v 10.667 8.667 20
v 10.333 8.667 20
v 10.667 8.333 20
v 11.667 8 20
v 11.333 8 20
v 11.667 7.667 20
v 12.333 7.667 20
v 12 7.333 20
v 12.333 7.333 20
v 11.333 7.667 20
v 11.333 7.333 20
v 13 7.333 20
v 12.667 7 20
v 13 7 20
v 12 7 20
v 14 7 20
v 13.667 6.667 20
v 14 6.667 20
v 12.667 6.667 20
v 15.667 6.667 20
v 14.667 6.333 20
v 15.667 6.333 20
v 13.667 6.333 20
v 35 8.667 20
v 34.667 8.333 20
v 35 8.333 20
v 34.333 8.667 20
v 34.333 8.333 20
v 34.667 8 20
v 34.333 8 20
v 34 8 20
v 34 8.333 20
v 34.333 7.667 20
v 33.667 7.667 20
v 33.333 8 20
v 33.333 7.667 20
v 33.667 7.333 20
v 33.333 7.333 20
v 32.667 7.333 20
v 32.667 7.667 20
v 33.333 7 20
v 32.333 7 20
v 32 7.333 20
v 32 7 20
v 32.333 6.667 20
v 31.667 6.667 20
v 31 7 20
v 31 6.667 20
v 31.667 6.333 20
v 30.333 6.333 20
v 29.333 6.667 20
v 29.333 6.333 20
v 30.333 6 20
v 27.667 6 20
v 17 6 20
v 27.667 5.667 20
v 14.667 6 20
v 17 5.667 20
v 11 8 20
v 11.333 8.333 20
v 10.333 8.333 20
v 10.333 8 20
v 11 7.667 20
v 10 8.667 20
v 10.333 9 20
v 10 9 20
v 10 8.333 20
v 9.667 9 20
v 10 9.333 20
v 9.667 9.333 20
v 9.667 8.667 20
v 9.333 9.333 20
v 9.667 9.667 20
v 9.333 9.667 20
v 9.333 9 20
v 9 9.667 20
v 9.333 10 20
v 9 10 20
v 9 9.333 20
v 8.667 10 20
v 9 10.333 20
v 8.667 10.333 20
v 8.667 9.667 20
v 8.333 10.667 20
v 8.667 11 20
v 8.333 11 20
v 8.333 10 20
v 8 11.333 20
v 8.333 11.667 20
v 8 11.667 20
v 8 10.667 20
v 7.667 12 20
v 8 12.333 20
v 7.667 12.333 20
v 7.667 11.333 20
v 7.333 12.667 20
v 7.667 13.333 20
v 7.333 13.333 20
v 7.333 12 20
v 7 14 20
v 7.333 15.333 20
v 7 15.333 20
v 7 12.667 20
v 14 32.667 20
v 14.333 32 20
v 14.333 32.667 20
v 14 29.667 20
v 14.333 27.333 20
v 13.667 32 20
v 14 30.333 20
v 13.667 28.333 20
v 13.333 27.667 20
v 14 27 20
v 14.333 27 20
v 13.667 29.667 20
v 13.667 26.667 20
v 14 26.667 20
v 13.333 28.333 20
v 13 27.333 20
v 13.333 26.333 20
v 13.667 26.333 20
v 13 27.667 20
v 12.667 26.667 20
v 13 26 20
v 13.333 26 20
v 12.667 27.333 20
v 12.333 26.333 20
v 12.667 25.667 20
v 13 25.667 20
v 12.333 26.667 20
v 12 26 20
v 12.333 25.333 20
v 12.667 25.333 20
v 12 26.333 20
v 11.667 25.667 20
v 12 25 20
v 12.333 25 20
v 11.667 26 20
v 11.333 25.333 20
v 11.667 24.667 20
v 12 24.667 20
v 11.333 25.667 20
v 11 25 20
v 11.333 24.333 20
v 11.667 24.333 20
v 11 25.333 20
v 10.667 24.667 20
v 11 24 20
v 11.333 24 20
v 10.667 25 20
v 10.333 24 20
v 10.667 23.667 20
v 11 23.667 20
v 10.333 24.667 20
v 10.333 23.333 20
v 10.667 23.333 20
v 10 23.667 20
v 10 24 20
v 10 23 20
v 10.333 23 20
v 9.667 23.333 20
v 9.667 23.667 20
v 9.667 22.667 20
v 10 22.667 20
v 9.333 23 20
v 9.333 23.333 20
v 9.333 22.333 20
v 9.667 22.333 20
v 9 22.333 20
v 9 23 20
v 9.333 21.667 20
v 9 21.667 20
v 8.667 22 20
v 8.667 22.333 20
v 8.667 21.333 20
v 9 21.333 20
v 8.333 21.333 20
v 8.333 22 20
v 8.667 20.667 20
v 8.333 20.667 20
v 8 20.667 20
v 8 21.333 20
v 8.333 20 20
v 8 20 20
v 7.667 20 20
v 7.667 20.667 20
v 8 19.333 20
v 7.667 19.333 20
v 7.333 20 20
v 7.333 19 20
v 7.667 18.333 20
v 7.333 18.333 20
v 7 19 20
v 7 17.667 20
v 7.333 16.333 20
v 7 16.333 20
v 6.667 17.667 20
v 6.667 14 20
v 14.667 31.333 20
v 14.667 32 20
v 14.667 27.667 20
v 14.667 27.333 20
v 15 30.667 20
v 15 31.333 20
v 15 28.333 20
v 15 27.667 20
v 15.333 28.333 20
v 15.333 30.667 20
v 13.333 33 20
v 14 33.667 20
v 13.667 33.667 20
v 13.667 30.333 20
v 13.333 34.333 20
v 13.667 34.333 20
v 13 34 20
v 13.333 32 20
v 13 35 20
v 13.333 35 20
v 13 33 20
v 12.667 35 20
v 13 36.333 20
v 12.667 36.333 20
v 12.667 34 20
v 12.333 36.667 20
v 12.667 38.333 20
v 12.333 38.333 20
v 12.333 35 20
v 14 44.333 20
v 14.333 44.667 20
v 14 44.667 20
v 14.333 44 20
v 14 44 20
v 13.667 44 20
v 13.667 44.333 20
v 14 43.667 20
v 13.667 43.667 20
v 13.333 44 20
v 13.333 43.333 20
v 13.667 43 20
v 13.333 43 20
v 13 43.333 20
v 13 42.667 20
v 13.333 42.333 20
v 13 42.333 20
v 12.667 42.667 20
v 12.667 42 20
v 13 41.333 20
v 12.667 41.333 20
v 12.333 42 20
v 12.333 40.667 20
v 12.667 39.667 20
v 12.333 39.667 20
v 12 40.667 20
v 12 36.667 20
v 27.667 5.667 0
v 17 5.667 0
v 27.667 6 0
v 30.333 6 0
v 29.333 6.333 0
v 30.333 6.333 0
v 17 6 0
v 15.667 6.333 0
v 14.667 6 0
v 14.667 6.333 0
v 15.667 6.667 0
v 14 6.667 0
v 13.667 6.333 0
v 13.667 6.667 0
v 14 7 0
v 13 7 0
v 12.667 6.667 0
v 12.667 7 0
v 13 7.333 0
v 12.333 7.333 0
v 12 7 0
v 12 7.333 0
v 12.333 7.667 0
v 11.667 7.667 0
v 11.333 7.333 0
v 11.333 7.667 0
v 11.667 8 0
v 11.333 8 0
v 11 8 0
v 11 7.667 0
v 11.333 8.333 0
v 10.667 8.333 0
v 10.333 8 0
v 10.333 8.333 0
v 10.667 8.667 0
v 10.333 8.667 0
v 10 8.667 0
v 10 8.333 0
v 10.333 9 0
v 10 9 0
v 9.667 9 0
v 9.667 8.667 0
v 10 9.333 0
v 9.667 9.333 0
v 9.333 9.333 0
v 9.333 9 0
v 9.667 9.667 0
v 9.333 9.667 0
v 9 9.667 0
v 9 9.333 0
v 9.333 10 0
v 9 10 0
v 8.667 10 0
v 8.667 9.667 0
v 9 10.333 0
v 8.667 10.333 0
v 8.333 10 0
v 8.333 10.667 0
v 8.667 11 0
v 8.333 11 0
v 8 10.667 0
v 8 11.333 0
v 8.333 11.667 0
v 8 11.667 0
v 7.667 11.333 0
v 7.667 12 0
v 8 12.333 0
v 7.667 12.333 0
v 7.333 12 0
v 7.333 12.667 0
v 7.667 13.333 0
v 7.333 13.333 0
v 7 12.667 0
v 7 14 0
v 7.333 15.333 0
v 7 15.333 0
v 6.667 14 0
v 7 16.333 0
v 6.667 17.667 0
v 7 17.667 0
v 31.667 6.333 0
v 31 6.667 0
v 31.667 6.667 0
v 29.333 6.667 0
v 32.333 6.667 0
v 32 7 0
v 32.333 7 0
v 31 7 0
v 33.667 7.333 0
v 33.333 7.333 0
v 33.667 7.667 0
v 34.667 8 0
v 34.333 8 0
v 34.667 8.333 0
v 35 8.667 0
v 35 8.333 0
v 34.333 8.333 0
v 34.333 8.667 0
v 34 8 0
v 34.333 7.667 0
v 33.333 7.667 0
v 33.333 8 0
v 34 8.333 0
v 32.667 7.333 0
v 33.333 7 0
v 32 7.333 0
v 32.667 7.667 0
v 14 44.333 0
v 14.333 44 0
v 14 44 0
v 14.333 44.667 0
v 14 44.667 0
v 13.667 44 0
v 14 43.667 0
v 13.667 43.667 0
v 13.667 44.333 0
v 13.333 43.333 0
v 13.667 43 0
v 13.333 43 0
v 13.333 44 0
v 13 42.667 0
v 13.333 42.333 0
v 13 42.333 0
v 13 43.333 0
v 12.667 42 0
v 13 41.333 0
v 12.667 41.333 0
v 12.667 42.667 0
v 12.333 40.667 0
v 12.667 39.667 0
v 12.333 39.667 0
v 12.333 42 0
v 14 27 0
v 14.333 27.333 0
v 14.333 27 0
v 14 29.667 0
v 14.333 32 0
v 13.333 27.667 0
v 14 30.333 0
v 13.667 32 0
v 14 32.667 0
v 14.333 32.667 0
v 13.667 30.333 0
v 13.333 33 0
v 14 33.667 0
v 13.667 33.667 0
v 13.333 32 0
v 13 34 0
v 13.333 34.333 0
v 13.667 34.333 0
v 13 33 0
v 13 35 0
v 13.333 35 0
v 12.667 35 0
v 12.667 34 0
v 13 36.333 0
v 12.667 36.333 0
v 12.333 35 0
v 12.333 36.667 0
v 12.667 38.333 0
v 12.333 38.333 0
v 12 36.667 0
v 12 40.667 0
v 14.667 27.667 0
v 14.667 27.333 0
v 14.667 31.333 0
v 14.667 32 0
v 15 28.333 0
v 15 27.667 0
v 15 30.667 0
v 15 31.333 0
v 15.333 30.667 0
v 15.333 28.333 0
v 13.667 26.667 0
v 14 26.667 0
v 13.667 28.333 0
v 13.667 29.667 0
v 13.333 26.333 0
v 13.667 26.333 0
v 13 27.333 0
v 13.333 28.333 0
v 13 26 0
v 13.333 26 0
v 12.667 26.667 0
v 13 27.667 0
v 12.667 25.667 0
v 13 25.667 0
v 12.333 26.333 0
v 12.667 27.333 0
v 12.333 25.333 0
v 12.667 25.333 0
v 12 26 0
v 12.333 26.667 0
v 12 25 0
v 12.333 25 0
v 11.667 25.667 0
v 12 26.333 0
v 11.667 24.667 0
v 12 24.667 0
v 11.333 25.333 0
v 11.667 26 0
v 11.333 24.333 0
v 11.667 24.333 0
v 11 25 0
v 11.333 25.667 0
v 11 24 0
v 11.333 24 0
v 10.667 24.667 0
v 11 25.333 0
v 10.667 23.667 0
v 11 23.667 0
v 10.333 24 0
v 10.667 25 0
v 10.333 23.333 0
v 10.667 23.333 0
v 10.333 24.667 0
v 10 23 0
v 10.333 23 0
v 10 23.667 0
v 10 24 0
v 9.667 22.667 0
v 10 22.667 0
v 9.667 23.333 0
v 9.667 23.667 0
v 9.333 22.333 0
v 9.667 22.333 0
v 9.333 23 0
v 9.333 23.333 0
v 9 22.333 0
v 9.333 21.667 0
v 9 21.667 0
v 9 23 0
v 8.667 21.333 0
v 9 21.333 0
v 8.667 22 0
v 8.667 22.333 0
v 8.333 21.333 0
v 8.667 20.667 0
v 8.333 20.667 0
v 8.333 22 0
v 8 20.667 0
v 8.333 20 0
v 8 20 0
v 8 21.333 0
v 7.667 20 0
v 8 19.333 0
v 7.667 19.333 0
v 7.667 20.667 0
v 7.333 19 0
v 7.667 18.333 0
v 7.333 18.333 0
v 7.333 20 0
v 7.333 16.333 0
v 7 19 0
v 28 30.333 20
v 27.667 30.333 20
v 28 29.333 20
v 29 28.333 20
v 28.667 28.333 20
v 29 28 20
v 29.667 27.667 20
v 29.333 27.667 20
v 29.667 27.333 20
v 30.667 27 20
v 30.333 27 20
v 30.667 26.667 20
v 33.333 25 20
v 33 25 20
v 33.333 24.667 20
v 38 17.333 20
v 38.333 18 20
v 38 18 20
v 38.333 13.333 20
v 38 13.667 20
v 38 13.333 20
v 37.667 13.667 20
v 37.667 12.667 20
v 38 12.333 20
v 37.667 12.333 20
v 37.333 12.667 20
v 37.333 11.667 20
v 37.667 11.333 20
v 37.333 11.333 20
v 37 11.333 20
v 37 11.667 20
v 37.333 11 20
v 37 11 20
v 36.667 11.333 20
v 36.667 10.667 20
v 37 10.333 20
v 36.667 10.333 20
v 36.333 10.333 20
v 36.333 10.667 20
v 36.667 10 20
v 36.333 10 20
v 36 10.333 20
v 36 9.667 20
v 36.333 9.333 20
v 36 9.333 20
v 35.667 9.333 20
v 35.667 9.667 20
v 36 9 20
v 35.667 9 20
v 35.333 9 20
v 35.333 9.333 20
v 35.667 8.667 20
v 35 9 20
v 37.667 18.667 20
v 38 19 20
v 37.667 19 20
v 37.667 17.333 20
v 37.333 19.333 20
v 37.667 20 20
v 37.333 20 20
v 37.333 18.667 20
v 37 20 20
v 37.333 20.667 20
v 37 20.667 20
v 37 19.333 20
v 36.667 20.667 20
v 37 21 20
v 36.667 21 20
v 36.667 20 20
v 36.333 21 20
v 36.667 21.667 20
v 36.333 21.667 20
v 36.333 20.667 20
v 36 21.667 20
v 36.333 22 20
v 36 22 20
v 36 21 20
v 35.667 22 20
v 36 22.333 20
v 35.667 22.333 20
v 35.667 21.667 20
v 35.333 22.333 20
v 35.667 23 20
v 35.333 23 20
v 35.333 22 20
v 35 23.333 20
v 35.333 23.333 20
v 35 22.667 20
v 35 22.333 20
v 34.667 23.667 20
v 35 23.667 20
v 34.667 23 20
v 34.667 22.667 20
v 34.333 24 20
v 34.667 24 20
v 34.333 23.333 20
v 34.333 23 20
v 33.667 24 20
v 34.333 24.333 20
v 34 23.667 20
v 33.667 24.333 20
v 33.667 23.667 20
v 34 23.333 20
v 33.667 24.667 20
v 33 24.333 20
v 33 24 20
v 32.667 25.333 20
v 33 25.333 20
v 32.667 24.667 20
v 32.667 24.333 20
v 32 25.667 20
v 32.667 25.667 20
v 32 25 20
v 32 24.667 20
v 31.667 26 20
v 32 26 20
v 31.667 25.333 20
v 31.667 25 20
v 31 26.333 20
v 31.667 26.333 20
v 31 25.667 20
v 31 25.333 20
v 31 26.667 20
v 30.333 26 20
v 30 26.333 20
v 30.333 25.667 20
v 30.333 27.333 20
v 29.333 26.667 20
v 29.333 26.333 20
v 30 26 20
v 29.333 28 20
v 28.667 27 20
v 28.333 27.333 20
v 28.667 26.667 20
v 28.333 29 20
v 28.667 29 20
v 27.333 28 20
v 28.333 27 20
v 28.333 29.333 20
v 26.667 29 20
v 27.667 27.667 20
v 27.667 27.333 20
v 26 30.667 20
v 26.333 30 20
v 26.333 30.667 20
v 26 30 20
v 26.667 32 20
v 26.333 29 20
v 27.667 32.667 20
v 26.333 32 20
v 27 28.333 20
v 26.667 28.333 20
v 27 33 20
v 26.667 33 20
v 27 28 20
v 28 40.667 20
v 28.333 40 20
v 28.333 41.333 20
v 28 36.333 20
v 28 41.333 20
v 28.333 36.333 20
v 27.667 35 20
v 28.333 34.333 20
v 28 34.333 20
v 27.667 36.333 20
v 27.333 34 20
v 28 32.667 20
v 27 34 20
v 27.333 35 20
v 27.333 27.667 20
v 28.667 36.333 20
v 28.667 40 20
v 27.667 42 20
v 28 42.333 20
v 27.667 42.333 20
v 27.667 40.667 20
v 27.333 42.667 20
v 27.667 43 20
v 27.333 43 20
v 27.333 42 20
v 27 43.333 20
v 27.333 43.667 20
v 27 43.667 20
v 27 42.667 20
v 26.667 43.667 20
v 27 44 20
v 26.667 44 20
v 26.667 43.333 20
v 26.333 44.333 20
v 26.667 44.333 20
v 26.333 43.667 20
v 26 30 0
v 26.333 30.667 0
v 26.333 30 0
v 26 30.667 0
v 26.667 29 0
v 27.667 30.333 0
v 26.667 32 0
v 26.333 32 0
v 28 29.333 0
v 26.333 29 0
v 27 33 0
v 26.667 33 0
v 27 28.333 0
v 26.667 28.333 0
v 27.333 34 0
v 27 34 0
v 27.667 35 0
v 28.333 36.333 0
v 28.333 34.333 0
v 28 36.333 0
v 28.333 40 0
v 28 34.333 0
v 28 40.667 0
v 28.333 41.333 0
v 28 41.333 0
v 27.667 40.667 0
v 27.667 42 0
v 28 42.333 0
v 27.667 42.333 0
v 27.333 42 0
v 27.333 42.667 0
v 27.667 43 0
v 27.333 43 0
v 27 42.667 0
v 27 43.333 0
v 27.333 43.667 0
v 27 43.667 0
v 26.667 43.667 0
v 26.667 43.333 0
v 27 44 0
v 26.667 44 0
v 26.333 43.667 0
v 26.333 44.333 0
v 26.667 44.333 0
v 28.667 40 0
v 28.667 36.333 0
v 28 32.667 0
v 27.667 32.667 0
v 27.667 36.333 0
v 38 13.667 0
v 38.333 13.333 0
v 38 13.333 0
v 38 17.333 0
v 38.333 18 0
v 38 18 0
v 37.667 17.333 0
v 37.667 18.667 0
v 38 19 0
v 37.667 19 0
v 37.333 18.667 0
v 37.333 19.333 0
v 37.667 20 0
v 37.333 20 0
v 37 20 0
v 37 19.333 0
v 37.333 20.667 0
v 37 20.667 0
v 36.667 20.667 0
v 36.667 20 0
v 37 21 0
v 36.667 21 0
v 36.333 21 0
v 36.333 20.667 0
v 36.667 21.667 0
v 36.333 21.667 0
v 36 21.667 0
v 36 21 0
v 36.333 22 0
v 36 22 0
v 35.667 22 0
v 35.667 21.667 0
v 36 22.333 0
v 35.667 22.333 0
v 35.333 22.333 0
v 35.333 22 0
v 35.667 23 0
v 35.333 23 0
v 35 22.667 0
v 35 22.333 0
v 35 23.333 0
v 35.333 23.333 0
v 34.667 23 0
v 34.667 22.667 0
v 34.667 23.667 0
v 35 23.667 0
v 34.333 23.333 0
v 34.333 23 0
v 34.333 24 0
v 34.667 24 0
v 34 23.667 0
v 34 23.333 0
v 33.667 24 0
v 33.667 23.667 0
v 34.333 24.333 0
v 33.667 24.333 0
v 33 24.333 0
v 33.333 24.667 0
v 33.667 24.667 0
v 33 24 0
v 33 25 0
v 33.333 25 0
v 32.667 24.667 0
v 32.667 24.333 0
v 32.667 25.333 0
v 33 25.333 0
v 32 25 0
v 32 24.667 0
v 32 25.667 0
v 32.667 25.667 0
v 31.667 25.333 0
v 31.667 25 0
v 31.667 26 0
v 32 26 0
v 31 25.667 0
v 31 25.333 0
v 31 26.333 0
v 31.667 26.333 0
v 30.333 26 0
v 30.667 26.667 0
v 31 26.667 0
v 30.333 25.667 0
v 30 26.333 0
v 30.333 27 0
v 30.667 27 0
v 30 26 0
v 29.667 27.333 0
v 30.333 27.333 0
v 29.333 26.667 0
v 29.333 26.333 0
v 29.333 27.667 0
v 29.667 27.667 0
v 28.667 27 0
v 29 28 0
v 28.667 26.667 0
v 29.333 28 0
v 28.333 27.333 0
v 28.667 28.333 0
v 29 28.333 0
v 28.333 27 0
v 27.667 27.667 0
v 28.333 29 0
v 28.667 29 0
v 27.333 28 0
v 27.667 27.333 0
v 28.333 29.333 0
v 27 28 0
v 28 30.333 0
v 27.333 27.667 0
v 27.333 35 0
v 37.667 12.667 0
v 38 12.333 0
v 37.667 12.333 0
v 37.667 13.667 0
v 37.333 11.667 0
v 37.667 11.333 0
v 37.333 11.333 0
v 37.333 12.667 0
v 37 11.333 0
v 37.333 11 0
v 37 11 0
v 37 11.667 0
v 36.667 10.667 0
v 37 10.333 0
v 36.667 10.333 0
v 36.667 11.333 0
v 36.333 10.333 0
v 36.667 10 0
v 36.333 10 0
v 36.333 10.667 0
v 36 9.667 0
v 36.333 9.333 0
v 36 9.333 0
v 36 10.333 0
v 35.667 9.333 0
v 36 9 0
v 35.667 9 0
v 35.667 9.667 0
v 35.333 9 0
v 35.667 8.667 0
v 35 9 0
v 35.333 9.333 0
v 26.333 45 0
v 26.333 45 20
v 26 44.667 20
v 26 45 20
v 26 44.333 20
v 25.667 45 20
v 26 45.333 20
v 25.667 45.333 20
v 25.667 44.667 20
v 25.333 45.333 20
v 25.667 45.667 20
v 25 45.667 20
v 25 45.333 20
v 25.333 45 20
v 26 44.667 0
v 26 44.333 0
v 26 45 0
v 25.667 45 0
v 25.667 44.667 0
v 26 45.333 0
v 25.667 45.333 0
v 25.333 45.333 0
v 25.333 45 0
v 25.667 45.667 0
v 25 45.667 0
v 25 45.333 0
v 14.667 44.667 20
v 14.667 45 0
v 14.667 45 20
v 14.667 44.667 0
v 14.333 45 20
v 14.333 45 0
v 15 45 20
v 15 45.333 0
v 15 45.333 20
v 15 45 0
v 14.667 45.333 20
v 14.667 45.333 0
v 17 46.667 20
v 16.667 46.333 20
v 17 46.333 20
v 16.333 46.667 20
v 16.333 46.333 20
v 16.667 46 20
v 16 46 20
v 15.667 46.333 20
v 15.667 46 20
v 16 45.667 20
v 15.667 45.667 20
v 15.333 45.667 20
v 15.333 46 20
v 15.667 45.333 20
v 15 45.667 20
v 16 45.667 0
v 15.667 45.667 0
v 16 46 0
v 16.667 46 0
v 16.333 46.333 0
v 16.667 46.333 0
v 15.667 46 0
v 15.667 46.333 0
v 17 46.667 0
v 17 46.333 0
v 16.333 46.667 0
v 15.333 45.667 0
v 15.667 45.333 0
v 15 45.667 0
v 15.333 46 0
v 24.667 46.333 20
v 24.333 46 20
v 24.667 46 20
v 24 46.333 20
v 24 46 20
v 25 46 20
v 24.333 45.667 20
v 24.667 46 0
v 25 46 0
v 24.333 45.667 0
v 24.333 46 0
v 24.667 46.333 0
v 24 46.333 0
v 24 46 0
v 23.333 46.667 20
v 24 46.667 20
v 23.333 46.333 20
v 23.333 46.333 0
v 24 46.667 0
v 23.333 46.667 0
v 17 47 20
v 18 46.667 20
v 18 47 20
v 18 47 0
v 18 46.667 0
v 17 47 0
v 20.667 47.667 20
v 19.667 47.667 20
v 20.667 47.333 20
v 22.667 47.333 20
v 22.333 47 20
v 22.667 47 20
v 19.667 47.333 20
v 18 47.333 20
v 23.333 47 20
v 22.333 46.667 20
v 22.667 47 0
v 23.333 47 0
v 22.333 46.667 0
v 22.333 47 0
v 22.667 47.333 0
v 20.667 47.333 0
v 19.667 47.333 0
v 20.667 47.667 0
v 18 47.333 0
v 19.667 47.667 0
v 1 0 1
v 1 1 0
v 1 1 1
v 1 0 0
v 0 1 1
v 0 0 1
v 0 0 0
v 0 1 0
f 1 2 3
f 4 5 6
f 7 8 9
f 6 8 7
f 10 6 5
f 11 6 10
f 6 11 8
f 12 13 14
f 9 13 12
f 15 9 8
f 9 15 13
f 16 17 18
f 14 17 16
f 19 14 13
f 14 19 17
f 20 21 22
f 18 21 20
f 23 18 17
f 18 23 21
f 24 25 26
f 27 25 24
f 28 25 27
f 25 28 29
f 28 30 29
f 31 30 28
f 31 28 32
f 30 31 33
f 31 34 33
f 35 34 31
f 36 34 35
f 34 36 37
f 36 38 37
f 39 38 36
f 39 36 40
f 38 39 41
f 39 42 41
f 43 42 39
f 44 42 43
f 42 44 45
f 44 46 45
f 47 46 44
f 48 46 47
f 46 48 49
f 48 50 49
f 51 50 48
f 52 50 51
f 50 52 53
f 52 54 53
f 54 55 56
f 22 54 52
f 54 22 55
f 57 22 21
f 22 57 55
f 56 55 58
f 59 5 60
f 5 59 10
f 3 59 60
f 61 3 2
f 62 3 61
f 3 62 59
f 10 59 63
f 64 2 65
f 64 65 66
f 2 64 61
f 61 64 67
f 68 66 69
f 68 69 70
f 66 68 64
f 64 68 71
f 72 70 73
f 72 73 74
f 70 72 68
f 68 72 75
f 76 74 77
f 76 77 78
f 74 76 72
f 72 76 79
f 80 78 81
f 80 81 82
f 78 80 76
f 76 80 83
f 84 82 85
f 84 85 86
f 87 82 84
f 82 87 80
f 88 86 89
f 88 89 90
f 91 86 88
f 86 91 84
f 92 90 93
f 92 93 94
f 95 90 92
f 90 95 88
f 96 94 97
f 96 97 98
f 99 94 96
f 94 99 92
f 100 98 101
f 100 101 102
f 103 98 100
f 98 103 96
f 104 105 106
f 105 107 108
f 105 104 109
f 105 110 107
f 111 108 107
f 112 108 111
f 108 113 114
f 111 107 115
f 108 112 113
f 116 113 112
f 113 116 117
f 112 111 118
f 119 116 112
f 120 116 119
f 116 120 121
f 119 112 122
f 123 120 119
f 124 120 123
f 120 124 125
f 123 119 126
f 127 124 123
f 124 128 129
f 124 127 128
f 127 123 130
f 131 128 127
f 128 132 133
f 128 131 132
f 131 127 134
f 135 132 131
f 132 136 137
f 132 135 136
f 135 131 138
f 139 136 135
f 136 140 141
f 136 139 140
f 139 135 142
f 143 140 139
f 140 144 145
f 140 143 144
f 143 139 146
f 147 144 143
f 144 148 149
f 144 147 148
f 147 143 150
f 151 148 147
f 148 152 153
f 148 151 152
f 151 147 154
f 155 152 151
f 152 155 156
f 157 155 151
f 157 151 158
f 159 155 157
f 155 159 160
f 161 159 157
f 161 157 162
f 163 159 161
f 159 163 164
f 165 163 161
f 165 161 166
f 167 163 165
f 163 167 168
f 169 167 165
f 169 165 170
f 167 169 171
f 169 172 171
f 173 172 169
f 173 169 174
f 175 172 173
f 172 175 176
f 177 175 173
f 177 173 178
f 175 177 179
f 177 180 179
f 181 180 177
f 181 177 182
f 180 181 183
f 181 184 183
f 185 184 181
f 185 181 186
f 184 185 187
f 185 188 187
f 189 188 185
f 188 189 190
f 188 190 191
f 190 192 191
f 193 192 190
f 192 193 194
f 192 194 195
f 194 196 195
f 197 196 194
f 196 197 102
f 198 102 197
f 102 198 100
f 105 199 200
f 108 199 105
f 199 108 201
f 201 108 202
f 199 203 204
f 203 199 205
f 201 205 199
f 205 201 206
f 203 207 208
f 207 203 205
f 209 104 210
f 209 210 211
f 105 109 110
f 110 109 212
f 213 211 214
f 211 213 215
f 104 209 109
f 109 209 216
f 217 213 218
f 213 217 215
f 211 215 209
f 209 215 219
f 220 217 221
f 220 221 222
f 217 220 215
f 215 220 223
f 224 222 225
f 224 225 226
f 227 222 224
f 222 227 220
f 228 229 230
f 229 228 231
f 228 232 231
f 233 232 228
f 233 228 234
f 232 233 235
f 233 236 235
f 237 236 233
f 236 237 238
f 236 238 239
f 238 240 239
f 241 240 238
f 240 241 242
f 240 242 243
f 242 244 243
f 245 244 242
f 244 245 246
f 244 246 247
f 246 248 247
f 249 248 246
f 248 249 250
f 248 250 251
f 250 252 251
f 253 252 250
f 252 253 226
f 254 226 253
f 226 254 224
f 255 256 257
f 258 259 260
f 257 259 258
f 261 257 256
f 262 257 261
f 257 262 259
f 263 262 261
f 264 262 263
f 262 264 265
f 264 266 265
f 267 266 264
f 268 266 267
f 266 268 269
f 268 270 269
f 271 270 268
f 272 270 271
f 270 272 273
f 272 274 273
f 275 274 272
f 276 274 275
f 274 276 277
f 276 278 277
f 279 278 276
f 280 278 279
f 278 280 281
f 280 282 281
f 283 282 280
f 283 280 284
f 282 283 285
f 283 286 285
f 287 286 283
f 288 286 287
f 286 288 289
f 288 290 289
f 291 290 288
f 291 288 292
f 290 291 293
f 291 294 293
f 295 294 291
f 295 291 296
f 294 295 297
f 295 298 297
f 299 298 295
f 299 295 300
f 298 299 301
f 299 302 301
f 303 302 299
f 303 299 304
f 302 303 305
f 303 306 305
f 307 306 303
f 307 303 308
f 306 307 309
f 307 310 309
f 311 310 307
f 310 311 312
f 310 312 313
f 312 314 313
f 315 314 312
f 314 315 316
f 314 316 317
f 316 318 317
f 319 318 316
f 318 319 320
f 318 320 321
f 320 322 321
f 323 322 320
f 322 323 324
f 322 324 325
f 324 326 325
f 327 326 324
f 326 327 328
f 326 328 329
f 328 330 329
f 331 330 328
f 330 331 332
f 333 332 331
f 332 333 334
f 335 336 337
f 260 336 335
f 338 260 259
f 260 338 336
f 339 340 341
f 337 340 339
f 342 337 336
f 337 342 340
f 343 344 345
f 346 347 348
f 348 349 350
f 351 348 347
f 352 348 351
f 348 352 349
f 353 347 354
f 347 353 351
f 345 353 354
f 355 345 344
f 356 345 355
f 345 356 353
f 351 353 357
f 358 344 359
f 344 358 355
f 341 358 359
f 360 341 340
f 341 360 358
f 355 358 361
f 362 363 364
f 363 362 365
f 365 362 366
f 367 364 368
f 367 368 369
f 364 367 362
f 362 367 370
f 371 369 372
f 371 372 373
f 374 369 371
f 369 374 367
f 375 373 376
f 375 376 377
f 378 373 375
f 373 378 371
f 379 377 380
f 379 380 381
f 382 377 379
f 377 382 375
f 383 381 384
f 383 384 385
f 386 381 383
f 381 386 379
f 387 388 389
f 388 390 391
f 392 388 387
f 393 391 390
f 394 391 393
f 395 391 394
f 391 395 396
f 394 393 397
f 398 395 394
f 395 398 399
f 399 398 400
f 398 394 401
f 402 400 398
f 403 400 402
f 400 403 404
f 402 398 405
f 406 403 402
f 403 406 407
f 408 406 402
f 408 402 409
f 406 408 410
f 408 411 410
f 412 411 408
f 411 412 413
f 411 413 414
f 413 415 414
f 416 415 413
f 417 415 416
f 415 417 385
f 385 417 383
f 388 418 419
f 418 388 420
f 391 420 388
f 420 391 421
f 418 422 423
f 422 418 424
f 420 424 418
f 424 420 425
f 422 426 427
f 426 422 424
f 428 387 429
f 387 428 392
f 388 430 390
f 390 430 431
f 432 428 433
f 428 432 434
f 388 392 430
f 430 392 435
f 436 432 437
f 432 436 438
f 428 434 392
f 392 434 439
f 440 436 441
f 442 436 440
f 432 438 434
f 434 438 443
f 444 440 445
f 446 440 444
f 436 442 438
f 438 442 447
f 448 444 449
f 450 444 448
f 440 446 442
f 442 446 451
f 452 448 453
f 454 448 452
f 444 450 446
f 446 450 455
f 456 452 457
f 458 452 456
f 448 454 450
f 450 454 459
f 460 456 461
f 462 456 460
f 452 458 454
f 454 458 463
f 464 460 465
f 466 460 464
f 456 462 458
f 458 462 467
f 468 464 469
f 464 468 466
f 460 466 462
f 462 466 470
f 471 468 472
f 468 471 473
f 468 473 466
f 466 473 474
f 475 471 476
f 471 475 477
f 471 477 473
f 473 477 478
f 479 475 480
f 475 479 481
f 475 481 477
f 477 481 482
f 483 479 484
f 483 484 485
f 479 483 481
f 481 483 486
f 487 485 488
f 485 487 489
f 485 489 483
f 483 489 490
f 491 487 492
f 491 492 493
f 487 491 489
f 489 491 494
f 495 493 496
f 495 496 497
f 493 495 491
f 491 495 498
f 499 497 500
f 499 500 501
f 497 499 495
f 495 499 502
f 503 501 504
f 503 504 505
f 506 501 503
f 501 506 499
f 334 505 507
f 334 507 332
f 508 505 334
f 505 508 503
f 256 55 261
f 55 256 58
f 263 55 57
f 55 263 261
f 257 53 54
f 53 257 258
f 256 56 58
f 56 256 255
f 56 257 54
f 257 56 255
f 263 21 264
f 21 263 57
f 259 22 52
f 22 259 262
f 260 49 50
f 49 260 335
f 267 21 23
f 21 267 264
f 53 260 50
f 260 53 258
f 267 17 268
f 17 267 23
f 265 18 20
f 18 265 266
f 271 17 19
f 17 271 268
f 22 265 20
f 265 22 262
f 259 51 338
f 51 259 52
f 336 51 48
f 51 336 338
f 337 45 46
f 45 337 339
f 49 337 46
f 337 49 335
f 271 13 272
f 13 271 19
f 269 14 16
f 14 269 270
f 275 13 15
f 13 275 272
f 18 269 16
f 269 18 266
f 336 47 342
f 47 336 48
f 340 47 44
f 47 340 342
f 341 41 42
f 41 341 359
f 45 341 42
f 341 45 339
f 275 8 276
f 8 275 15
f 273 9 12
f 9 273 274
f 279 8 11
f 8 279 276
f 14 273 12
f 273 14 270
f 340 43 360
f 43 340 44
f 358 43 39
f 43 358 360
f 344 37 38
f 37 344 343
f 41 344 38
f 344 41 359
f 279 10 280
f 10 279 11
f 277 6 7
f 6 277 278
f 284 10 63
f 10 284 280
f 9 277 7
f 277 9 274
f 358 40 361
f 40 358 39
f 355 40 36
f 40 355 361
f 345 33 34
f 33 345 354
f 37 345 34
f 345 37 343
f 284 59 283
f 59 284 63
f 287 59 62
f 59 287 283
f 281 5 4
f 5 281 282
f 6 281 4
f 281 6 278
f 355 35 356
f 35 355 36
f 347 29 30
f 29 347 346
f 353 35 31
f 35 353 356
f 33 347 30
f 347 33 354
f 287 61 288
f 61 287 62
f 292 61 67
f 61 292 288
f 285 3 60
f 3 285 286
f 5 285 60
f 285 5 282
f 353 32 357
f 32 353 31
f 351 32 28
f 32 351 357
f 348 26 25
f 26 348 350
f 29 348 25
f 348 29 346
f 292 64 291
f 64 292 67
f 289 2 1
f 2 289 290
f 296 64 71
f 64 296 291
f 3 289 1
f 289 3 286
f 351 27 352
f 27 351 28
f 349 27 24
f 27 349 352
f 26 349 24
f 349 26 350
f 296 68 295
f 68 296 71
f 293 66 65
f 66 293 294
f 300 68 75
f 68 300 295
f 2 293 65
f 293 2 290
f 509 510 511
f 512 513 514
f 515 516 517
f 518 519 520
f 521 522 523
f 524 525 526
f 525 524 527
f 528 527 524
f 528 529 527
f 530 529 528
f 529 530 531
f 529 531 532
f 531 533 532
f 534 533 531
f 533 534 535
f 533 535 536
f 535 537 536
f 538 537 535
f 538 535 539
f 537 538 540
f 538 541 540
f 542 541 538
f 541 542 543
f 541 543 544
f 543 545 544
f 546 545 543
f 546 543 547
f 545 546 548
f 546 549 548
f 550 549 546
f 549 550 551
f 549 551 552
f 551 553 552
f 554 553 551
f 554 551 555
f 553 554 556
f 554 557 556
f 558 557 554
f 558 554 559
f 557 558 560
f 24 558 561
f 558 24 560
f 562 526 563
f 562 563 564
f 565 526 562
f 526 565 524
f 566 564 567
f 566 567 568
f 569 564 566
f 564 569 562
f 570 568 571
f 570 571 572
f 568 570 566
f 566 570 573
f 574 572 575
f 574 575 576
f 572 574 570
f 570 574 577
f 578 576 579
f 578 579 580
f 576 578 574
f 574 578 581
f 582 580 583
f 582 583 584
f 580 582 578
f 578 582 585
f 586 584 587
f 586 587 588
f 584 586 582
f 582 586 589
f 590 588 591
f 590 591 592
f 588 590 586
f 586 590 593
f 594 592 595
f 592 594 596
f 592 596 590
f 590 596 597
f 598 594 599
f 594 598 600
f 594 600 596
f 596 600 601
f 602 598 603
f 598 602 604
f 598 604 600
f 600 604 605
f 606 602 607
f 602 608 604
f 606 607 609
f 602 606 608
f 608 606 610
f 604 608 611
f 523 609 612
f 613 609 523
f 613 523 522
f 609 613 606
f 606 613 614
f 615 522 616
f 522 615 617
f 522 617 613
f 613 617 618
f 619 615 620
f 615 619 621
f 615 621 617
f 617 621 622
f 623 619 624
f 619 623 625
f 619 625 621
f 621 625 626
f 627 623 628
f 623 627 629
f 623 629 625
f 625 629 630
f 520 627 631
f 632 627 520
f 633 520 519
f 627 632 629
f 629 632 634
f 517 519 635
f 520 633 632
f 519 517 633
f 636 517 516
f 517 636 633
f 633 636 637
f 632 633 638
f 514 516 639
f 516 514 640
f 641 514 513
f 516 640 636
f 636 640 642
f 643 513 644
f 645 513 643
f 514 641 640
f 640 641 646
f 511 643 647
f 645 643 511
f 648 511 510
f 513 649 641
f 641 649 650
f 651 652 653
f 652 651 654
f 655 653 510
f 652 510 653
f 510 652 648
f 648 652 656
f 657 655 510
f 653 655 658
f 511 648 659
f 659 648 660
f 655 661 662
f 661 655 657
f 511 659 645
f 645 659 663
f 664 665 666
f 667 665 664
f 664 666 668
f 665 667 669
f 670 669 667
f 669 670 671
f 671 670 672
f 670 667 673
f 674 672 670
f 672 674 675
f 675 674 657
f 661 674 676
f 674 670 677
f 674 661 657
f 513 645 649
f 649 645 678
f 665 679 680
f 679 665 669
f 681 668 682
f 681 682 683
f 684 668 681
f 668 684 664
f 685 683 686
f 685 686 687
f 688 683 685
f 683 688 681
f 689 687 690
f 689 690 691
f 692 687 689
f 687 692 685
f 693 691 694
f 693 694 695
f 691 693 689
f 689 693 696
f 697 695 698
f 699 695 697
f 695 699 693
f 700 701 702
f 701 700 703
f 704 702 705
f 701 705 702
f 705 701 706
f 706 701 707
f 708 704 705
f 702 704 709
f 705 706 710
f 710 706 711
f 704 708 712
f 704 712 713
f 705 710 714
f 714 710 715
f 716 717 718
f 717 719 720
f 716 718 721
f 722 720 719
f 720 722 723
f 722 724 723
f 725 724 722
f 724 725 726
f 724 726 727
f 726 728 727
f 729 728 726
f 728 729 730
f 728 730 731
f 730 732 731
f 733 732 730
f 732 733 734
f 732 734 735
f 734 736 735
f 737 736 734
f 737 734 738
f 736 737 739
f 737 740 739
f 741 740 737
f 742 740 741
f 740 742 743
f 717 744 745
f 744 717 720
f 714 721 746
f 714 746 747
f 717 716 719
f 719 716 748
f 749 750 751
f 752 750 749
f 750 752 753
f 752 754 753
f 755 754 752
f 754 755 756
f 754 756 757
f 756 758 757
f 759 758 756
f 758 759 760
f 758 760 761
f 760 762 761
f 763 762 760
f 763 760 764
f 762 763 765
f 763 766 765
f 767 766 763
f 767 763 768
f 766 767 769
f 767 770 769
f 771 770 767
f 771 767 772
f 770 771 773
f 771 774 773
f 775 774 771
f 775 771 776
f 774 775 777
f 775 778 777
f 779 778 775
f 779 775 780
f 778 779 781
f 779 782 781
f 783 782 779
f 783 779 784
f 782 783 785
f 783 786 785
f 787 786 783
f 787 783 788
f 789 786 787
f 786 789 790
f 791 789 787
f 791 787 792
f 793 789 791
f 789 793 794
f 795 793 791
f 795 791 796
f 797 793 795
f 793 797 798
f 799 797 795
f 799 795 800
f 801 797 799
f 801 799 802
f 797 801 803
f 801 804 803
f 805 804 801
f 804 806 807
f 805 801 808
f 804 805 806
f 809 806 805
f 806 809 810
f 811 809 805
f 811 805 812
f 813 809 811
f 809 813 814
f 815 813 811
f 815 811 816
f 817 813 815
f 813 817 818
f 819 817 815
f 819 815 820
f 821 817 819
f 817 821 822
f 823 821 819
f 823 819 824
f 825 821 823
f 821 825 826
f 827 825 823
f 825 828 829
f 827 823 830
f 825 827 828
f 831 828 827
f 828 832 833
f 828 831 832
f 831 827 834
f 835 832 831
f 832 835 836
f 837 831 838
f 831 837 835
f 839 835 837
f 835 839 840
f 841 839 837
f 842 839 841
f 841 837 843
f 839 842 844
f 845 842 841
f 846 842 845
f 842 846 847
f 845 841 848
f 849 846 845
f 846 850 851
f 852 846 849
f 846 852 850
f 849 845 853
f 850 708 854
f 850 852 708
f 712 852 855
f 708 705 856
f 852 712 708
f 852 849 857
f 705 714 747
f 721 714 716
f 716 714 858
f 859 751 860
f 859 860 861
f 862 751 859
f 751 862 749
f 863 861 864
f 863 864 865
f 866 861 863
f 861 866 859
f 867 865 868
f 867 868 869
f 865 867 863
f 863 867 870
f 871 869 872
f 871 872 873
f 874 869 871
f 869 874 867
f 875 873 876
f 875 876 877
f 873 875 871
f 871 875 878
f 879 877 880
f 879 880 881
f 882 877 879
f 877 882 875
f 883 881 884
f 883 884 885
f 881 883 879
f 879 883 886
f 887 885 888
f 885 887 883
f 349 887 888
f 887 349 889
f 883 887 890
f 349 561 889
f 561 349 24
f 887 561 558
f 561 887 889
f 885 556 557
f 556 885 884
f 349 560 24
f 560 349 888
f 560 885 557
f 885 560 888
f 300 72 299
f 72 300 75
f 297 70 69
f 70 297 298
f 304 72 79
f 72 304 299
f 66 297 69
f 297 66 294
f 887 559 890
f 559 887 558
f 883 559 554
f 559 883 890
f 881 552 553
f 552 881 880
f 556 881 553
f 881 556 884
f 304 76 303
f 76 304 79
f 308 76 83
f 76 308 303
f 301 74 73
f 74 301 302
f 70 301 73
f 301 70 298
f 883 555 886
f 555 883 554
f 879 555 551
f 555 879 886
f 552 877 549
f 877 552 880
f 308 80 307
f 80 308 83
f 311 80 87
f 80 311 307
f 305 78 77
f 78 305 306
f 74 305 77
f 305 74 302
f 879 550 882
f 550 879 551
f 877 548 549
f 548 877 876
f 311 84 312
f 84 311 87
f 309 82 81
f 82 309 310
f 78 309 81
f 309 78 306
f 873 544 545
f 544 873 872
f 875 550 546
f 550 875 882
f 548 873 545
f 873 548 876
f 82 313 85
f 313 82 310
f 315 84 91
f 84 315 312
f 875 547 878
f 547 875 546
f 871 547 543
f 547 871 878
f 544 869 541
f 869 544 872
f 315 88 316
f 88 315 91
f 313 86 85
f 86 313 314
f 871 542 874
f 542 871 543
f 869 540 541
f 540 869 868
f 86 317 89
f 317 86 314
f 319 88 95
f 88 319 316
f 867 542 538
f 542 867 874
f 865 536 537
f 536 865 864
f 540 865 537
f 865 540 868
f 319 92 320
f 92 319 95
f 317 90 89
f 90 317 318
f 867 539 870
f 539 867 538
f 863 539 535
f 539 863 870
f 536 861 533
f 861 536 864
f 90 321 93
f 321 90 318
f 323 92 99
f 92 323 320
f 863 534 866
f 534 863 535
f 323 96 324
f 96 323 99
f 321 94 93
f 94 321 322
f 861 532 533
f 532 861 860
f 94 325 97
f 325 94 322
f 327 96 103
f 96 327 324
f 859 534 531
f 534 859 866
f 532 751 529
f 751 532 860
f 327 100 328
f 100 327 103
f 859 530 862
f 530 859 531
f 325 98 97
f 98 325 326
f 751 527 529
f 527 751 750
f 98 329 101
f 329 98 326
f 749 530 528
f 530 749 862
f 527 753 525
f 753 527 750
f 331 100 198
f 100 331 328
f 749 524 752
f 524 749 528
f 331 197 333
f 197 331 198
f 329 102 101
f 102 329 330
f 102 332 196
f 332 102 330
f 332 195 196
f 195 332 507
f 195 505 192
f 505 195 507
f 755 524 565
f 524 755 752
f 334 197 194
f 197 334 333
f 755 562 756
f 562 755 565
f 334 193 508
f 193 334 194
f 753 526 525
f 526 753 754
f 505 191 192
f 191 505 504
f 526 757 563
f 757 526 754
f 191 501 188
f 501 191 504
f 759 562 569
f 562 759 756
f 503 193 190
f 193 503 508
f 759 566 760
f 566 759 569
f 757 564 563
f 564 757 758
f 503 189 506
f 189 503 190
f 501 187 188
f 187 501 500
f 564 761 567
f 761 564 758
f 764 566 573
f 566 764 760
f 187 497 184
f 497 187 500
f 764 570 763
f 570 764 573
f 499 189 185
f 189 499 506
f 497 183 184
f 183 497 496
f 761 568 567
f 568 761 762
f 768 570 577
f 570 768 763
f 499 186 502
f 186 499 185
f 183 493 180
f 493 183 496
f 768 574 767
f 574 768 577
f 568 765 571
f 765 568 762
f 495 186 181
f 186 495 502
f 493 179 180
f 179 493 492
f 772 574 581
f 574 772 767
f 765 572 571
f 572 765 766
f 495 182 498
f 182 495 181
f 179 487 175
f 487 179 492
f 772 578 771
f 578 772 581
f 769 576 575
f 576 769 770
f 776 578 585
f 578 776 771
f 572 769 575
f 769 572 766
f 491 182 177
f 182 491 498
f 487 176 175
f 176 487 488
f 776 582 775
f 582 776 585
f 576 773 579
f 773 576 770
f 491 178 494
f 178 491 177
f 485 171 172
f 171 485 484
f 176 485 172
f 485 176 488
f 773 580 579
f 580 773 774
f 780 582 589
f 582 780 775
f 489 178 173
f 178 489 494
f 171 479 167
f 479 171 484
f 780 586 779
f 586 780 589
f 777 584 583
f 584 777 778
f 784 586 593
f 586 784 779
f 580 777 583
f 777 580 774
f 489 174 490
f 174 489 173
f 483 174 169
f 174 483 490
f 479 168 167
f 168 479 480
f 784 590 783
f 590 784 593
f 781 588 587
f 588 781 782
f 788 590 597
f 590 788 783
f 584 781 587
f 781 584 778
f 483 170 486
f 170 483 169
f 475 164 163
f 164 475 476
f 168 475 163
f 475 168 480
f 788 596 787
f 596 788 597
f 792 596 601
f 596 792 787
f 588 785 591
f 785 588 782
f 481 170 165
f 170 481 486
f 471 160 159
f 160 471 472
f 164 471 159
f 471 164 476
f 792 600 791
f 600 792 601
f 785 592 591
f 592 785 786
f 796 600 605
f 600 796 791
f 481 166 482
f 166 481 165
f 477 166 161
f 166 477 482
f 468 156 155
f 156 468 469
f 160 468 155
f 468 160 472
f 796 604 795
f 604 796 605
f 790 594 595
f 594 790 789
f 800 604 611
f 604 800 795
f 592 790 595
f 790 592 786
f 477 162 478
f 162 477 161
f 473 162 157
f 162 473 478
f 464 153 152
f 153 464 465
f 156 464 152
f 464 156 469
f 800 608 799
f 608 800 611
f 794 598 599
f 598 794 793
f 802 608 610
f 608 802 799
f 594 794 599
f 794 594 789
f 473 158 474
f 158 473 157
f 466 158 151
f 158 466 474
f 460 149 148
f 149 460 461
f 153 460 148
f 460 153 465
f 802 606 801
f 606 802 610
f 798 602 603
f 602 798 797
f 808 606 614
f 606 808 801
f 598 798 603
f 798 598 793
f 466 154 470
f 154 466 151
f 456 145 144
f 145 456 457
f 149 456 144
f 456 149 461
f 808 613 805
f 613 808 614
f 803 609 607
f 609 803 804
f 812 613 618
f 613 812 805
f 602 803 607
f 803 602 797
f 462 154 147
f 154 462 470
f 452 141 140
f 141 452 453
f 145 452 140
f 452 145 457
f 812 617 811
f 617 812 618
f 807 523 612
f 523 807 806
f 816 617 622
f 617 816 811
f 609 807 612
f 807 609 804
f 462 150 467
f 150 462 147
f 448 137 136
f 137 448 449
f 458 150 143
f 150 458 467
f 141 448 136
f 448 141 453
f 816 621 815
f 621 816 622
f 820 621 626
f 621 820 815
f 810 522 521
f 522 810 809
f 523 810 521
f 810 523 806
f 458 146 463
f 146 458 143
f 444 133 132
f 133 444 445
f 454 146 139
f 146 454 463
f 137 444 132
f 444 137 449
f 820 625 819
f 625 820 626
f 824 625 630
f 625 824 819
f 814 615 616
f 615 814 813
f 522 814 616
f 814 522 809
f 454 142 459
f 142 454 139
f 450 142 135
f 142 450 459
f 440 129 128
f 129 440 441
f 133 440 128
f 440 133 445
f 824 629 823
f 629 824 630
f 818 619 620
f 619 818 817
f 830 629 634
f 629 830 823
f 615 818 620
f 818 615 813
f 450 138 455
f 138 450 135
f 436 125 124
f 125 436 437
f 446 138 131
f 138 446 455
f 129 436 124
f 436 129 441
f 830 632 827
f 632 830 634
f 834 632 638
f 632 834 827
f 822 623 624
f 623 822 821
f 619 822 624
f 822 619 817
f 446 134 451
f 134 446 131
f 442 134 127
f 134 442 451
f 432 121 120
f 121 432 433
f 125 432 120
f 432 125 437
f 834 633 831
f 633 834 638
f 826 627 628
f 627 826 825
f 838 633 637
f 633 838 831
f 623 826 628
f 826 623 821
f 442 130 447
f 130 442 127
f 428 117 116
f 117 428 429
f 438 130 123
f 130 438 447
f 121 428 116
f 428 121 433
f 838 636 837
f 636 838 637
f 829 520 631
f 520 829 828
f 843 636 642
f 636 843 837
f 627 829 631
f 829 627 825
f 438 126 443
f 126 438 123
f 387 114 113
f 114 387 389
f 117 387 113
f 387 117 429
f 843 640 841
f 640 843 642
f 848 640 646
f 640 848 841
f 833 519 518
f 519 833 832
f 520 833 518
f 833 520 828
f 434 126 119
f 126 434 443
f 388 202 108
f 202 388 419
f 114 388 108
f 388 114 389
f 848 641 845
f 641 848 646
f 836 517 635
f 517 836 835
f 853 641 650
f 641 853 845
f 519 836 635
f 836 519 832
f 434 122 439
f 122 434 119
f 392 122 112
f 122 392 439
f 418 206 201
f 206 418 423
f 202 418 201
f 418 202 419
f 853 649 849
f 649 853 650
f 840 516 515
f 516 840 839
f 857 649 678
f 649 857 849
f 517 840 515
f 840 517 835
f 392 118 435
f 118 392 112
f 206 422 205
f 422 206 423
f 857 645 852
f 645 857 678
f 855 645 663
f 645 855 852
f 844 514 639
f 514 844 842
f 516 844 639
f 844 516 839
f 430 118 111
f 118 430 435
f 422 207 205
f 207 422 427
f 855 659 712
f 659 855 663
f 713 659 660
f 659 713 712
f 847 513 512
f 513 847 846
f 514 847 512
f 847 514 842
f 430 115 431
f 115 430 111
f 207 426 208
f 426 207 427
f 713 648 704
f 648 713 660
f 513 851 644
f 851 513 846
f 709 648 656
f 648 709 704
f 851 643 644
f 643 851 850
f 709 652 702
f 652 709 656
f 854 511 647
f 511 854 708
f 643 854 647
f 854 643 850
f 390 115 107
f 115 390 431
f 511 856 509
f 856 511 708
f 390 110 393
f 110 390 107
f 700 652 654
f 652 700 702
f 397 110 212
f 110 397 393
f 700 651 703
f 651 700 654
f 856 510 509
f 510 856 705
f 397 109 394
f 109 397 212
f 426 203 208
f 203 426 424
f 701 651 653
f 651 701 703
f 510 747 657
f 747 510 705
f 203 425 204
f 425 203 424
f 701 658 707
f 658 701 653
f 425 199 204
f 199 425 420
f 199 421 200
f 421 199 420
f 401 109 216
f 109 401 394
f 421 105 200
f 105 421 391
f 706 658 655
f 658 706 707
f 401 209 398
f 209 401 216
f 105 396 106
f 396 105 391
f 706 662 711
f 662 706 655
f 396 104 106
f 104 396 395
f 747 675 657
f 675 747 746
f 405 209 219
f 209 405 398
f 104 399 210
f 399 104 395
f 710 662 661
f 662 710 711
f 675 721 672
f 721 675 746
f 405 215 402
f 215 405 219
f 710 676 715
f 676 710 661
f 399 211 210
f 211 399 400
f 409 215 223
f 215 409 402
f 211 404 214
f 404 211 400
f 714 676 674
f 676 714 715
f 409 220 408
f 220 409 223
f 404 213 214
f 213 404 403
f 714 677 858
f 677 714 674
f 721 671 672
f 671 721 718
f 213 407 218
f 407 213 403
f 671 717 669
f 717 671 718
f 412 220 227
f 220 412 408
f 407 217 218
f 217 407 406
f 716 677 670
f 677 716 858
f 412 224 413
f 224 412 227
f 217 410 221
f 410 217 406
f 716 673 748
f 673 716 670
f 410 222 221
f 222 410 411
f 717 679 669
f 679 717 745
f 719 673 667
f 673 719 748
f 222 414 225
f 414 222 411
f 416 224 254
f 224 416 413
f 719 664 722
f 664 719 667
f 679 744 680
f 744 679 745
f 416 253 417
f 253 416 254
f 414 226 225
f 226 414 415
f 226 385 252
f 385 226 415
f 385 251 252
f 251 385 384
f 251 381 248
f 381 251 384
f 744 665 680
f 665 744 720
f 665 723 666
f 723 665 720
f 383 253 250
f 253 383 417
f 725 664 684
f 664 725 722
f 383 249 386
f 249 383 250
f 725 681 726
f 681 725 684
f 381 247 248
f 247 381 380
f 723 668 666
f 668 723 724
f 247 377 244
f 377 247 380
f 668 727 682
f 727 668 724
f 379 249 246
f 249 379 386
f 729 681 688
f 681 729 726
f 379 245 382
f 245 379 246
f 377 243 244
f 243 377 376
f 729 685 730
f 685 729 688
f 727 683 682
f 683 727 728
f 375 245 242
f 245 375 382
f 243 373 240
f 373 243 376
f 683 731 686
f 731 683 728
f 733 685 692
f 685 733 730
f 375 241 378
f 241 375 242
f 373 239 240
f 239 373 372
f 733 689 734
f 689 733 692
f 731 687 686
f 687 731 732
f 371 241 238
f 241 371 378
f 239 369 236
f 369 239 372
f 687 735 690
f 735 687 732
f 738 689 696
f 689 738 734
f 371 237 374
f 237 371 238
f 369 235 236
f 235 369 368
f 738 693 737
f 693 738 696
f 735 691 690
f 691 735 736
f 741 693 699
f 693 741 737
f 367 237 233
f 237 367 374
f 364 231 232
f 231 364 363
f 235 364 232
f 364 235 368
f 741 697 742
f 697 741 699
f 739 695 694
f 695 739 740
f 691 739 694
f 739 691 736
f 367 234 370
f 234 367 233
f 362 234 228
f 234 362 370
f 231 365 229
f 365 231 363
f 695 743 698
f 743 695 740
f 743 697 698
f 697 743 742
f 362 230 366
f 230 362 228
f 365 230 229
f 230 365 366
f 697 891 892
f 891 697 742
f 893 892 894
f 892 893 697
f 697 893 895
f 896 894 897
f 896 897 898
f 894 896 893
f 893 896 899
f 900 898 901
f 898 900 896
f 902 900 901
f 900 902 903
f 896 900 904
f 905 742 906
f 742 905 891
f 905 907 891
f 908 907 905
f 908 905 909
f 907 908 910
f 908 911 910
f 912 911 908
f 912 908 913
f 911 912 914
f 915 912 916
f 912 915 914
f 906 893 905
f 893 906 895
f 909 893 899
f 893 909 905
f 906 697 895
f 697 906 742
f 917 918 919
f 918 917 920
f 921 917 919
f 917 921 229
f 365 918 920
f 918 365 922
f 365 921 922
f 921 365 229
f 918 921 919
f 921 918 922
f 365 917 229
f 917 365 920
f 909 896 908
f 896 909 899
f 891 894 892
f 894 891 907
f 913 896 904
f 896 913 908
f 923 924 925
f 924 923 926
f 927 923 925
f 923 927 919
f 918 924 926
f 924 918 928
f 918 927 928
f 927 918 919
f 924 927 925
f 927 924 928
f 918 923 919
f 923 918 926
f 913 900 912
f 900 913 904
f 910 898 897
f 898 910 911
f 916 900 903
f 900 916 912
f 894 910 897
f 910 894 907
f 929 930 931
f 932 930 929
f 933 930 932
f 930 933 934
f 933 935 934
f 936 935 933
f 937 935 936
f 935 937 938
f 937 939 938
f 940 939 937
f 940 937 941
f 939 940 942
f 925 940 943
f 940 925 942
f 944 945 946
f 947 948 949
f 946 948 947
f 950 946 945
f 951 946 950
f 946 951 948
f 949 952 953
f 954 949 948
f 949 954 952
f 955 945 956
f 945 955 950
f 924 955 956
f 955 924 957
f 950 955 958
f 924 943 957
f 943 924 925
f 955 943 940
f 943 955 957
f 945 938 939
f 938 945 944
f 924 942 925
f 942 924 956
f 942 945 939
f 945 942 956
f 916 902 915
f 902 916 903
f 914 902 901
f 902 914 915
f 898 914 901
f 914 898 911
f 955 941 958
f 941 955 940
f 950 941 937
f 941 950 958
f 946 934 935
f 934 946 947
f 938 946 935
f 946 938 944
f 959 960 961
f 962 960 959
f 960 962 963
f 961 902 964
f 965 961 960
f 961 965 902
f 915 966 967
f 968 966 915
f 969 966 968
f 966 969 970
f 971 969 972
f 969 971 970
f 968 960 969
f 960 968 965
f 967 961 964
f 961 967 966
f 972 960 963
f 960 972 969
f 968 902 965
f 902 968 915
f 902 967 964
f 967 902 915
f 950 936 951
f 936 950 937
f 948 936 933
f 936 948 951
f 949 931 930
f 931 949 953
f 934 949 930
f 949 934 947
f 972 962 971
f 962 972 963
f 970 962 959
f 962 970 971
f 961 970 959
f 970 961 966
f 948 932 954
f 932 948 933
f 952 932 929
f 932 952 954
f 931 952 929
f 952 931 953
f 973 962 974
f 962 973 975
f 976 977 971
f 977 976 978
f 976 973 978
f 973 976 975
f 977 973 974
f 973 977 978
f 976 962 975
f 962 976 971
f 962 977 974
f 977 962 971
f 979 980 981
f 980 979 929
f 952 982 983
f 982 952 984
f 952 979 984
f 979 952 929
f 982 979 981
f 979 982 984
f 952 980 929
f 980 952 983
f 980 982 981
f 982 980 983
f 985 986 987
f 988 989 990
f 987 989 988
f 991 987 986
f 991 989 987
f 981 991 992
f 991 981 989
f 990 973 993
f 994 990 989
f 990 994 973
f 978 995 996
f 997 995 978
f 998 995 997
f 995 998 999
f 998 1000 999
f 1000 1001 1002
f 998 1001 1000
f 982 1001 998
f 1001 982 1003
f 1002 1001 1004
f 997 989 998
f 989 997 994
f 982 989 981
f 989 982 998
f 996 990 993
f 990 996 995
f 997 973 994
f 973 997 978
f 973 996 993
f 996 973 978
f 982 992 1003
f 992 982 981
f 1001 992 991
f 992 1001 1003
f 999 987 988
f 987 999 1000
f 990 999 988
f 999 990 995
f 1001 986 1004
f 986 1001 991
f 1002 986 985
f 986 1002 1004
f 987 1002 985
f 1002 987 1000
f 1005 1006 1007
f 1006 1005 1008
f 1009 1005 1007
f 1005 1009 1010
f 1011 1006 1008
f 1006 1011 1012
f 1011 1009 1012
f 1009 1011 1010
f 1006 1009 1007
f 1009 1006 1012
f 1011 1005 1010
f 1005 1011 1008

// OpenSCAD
/*
	Metaballs.scad
	Public Domain Code
	Placed By: William A Adams
	4 June 2011

	This code is a rudimentary implementation of the so called 'metaball' technique of soft object rendering.  It uses "granules" to register the isosurface which is the interaction of the various balls.

	Some good reading on metaballs can be found here:
http://www.gamedev.net/page/resources/_//feature/fprogramming/exploring-metaballs-and-isosurfaces-in-2d-r2556

*/

//goldenratio = 1.618;
goldenratio = 1;

cube(size=[1,1,1]);

DrawMetaballs(3, [[15, 15, 5], [30, 15, 5], [20, 40, 5]], 
	area = [100, 100], resolution = [3,3], thickness = 20);

//PlaceSculpture(resolution=[1,1], layerheight=1, numLayers=15);

//=========================================
//		Functions
//=========================================

// metaball - _x, _y, _radius
function  MBInfluence(x, y, mball) = (mball[2] / sqrt((x-mball[0])*(x-mball[0]) + (y-mball[1])*(y-mball[1])));

function Sum2(x,y,mballs) = MBInfluence(x,y,mballs[0])+MBInfluence(x,y,mballs[1]);
function Sum3(x,y,mballs) = MBInfluence(x,y,mballs[0])+MBInfluence(x,y,mballs[1])+MBInfluence(x,y,mballs[2]);

//==========================================
//		Modules
//==========================================

module PlaceSculpture(resolution=[1.5,1.5], layerheight=1, numLayers=5)
{
	for (layer=[0:numLayers])
	{
		translate([0,0,layerheight*layer])
		AnimateMetaBalls( resolution=resolution, thickness=layerheight, $t=layer/numLayers);
	}
}


module AnimateMetaBalls( resolution=[1,1], thickness = 4)
{
	DrawMetaballs(3, 
		ballList = [[15, 15, 5], 
			[15+$t*15, 15+ $t*25, 4], 
			[15+$t*25, 15, 4]], 
		area = [100, 100], 
		resolution = resolution, 
		thickness = thickness);
}

module DrawMetaballs(nBalls, ballList, area, resolution=[1,1], thickness=1)
{	
	xres = resolution[0];
	yres = resolution[1];

	SCREEN_WIDTH = area[0];
	SCREEN_HEIGHT = area[1];

	MIN_THRESHOLD = 0.98;
	MAX_THRESHOLD = 1.02;
	sum = 0;

	// Ideally, we'd do a linear_extrude, but right now, it's
	// way too computationally expensive
	//linear_extrude(height=thickness)
	for (y=[0:SCREEN_HEIGHT*yres])
	{
		for (x=[0:SCREEN_WIDTH*xres])
		{
			if (nBalls == 2)
			{
			sum=Sum2(x/xres, y/yres, ballList);
			
				if (sum > MIN_THRESHOLD && sum < MAX_THRESHOLD)
				{
					translate([x/xres, y/yres, 0])
					cube([1/xres, 1/yres, thickness]);
				}
			} else if (nBalls == 3)
			{
				sum=Sum3(x/xres, y/yres, ballList);
				
					if (sum > MIN_THRESHOLD && sum < MAX_THRESHOLD)
					{
						translate([x/xres, y/yres, 0])
						cube([1/xres, 1/yres, thickness]);
					}
				
			}
		}
	}
}
